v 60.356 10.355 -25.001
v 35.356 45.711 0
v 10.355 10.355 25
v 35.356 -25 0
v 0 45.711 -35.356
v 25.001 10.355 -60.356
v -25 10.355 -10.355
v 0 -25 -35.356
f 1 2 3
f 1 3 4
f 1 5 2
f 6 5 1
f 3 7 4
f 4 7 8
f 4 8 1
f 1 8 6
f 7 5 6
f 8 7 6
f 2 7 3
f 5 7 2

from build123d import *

# Parameters (mm, degrees)
F0_W     = 50.0006489456
F0_H     = 50.0006489456
F1_DEPTH = 50
F3_ANGLE = 45
F5_ANGLE = 45


with BuildPart() as f1:
    # F0 (on Top) → F1 (new body)
    with BuildSketch(Plane.XY):
        Rectangle(F0_W, F0_H)
    extrude(amount=F1_DEPTH)


with BuildPart() as f1_1:
    # F2: moved
    add(f1.part.moved(Location((0, 0, -25))))


with BuildPart() as f1_2:
    # F3: moved
    add(f1_1.part.rotate(Axis((25.0003244728, -25.0003244728, 0), (0, 0, -1)), F3_ANGLE))


with BuildPart() as f1_3:
    # F5: moved
    add(f1_2.part.rotate(Axis((0, 20.7308493555, 0), (0, 1, 0)), F5_ANGLE))


solid = f1_3.part
